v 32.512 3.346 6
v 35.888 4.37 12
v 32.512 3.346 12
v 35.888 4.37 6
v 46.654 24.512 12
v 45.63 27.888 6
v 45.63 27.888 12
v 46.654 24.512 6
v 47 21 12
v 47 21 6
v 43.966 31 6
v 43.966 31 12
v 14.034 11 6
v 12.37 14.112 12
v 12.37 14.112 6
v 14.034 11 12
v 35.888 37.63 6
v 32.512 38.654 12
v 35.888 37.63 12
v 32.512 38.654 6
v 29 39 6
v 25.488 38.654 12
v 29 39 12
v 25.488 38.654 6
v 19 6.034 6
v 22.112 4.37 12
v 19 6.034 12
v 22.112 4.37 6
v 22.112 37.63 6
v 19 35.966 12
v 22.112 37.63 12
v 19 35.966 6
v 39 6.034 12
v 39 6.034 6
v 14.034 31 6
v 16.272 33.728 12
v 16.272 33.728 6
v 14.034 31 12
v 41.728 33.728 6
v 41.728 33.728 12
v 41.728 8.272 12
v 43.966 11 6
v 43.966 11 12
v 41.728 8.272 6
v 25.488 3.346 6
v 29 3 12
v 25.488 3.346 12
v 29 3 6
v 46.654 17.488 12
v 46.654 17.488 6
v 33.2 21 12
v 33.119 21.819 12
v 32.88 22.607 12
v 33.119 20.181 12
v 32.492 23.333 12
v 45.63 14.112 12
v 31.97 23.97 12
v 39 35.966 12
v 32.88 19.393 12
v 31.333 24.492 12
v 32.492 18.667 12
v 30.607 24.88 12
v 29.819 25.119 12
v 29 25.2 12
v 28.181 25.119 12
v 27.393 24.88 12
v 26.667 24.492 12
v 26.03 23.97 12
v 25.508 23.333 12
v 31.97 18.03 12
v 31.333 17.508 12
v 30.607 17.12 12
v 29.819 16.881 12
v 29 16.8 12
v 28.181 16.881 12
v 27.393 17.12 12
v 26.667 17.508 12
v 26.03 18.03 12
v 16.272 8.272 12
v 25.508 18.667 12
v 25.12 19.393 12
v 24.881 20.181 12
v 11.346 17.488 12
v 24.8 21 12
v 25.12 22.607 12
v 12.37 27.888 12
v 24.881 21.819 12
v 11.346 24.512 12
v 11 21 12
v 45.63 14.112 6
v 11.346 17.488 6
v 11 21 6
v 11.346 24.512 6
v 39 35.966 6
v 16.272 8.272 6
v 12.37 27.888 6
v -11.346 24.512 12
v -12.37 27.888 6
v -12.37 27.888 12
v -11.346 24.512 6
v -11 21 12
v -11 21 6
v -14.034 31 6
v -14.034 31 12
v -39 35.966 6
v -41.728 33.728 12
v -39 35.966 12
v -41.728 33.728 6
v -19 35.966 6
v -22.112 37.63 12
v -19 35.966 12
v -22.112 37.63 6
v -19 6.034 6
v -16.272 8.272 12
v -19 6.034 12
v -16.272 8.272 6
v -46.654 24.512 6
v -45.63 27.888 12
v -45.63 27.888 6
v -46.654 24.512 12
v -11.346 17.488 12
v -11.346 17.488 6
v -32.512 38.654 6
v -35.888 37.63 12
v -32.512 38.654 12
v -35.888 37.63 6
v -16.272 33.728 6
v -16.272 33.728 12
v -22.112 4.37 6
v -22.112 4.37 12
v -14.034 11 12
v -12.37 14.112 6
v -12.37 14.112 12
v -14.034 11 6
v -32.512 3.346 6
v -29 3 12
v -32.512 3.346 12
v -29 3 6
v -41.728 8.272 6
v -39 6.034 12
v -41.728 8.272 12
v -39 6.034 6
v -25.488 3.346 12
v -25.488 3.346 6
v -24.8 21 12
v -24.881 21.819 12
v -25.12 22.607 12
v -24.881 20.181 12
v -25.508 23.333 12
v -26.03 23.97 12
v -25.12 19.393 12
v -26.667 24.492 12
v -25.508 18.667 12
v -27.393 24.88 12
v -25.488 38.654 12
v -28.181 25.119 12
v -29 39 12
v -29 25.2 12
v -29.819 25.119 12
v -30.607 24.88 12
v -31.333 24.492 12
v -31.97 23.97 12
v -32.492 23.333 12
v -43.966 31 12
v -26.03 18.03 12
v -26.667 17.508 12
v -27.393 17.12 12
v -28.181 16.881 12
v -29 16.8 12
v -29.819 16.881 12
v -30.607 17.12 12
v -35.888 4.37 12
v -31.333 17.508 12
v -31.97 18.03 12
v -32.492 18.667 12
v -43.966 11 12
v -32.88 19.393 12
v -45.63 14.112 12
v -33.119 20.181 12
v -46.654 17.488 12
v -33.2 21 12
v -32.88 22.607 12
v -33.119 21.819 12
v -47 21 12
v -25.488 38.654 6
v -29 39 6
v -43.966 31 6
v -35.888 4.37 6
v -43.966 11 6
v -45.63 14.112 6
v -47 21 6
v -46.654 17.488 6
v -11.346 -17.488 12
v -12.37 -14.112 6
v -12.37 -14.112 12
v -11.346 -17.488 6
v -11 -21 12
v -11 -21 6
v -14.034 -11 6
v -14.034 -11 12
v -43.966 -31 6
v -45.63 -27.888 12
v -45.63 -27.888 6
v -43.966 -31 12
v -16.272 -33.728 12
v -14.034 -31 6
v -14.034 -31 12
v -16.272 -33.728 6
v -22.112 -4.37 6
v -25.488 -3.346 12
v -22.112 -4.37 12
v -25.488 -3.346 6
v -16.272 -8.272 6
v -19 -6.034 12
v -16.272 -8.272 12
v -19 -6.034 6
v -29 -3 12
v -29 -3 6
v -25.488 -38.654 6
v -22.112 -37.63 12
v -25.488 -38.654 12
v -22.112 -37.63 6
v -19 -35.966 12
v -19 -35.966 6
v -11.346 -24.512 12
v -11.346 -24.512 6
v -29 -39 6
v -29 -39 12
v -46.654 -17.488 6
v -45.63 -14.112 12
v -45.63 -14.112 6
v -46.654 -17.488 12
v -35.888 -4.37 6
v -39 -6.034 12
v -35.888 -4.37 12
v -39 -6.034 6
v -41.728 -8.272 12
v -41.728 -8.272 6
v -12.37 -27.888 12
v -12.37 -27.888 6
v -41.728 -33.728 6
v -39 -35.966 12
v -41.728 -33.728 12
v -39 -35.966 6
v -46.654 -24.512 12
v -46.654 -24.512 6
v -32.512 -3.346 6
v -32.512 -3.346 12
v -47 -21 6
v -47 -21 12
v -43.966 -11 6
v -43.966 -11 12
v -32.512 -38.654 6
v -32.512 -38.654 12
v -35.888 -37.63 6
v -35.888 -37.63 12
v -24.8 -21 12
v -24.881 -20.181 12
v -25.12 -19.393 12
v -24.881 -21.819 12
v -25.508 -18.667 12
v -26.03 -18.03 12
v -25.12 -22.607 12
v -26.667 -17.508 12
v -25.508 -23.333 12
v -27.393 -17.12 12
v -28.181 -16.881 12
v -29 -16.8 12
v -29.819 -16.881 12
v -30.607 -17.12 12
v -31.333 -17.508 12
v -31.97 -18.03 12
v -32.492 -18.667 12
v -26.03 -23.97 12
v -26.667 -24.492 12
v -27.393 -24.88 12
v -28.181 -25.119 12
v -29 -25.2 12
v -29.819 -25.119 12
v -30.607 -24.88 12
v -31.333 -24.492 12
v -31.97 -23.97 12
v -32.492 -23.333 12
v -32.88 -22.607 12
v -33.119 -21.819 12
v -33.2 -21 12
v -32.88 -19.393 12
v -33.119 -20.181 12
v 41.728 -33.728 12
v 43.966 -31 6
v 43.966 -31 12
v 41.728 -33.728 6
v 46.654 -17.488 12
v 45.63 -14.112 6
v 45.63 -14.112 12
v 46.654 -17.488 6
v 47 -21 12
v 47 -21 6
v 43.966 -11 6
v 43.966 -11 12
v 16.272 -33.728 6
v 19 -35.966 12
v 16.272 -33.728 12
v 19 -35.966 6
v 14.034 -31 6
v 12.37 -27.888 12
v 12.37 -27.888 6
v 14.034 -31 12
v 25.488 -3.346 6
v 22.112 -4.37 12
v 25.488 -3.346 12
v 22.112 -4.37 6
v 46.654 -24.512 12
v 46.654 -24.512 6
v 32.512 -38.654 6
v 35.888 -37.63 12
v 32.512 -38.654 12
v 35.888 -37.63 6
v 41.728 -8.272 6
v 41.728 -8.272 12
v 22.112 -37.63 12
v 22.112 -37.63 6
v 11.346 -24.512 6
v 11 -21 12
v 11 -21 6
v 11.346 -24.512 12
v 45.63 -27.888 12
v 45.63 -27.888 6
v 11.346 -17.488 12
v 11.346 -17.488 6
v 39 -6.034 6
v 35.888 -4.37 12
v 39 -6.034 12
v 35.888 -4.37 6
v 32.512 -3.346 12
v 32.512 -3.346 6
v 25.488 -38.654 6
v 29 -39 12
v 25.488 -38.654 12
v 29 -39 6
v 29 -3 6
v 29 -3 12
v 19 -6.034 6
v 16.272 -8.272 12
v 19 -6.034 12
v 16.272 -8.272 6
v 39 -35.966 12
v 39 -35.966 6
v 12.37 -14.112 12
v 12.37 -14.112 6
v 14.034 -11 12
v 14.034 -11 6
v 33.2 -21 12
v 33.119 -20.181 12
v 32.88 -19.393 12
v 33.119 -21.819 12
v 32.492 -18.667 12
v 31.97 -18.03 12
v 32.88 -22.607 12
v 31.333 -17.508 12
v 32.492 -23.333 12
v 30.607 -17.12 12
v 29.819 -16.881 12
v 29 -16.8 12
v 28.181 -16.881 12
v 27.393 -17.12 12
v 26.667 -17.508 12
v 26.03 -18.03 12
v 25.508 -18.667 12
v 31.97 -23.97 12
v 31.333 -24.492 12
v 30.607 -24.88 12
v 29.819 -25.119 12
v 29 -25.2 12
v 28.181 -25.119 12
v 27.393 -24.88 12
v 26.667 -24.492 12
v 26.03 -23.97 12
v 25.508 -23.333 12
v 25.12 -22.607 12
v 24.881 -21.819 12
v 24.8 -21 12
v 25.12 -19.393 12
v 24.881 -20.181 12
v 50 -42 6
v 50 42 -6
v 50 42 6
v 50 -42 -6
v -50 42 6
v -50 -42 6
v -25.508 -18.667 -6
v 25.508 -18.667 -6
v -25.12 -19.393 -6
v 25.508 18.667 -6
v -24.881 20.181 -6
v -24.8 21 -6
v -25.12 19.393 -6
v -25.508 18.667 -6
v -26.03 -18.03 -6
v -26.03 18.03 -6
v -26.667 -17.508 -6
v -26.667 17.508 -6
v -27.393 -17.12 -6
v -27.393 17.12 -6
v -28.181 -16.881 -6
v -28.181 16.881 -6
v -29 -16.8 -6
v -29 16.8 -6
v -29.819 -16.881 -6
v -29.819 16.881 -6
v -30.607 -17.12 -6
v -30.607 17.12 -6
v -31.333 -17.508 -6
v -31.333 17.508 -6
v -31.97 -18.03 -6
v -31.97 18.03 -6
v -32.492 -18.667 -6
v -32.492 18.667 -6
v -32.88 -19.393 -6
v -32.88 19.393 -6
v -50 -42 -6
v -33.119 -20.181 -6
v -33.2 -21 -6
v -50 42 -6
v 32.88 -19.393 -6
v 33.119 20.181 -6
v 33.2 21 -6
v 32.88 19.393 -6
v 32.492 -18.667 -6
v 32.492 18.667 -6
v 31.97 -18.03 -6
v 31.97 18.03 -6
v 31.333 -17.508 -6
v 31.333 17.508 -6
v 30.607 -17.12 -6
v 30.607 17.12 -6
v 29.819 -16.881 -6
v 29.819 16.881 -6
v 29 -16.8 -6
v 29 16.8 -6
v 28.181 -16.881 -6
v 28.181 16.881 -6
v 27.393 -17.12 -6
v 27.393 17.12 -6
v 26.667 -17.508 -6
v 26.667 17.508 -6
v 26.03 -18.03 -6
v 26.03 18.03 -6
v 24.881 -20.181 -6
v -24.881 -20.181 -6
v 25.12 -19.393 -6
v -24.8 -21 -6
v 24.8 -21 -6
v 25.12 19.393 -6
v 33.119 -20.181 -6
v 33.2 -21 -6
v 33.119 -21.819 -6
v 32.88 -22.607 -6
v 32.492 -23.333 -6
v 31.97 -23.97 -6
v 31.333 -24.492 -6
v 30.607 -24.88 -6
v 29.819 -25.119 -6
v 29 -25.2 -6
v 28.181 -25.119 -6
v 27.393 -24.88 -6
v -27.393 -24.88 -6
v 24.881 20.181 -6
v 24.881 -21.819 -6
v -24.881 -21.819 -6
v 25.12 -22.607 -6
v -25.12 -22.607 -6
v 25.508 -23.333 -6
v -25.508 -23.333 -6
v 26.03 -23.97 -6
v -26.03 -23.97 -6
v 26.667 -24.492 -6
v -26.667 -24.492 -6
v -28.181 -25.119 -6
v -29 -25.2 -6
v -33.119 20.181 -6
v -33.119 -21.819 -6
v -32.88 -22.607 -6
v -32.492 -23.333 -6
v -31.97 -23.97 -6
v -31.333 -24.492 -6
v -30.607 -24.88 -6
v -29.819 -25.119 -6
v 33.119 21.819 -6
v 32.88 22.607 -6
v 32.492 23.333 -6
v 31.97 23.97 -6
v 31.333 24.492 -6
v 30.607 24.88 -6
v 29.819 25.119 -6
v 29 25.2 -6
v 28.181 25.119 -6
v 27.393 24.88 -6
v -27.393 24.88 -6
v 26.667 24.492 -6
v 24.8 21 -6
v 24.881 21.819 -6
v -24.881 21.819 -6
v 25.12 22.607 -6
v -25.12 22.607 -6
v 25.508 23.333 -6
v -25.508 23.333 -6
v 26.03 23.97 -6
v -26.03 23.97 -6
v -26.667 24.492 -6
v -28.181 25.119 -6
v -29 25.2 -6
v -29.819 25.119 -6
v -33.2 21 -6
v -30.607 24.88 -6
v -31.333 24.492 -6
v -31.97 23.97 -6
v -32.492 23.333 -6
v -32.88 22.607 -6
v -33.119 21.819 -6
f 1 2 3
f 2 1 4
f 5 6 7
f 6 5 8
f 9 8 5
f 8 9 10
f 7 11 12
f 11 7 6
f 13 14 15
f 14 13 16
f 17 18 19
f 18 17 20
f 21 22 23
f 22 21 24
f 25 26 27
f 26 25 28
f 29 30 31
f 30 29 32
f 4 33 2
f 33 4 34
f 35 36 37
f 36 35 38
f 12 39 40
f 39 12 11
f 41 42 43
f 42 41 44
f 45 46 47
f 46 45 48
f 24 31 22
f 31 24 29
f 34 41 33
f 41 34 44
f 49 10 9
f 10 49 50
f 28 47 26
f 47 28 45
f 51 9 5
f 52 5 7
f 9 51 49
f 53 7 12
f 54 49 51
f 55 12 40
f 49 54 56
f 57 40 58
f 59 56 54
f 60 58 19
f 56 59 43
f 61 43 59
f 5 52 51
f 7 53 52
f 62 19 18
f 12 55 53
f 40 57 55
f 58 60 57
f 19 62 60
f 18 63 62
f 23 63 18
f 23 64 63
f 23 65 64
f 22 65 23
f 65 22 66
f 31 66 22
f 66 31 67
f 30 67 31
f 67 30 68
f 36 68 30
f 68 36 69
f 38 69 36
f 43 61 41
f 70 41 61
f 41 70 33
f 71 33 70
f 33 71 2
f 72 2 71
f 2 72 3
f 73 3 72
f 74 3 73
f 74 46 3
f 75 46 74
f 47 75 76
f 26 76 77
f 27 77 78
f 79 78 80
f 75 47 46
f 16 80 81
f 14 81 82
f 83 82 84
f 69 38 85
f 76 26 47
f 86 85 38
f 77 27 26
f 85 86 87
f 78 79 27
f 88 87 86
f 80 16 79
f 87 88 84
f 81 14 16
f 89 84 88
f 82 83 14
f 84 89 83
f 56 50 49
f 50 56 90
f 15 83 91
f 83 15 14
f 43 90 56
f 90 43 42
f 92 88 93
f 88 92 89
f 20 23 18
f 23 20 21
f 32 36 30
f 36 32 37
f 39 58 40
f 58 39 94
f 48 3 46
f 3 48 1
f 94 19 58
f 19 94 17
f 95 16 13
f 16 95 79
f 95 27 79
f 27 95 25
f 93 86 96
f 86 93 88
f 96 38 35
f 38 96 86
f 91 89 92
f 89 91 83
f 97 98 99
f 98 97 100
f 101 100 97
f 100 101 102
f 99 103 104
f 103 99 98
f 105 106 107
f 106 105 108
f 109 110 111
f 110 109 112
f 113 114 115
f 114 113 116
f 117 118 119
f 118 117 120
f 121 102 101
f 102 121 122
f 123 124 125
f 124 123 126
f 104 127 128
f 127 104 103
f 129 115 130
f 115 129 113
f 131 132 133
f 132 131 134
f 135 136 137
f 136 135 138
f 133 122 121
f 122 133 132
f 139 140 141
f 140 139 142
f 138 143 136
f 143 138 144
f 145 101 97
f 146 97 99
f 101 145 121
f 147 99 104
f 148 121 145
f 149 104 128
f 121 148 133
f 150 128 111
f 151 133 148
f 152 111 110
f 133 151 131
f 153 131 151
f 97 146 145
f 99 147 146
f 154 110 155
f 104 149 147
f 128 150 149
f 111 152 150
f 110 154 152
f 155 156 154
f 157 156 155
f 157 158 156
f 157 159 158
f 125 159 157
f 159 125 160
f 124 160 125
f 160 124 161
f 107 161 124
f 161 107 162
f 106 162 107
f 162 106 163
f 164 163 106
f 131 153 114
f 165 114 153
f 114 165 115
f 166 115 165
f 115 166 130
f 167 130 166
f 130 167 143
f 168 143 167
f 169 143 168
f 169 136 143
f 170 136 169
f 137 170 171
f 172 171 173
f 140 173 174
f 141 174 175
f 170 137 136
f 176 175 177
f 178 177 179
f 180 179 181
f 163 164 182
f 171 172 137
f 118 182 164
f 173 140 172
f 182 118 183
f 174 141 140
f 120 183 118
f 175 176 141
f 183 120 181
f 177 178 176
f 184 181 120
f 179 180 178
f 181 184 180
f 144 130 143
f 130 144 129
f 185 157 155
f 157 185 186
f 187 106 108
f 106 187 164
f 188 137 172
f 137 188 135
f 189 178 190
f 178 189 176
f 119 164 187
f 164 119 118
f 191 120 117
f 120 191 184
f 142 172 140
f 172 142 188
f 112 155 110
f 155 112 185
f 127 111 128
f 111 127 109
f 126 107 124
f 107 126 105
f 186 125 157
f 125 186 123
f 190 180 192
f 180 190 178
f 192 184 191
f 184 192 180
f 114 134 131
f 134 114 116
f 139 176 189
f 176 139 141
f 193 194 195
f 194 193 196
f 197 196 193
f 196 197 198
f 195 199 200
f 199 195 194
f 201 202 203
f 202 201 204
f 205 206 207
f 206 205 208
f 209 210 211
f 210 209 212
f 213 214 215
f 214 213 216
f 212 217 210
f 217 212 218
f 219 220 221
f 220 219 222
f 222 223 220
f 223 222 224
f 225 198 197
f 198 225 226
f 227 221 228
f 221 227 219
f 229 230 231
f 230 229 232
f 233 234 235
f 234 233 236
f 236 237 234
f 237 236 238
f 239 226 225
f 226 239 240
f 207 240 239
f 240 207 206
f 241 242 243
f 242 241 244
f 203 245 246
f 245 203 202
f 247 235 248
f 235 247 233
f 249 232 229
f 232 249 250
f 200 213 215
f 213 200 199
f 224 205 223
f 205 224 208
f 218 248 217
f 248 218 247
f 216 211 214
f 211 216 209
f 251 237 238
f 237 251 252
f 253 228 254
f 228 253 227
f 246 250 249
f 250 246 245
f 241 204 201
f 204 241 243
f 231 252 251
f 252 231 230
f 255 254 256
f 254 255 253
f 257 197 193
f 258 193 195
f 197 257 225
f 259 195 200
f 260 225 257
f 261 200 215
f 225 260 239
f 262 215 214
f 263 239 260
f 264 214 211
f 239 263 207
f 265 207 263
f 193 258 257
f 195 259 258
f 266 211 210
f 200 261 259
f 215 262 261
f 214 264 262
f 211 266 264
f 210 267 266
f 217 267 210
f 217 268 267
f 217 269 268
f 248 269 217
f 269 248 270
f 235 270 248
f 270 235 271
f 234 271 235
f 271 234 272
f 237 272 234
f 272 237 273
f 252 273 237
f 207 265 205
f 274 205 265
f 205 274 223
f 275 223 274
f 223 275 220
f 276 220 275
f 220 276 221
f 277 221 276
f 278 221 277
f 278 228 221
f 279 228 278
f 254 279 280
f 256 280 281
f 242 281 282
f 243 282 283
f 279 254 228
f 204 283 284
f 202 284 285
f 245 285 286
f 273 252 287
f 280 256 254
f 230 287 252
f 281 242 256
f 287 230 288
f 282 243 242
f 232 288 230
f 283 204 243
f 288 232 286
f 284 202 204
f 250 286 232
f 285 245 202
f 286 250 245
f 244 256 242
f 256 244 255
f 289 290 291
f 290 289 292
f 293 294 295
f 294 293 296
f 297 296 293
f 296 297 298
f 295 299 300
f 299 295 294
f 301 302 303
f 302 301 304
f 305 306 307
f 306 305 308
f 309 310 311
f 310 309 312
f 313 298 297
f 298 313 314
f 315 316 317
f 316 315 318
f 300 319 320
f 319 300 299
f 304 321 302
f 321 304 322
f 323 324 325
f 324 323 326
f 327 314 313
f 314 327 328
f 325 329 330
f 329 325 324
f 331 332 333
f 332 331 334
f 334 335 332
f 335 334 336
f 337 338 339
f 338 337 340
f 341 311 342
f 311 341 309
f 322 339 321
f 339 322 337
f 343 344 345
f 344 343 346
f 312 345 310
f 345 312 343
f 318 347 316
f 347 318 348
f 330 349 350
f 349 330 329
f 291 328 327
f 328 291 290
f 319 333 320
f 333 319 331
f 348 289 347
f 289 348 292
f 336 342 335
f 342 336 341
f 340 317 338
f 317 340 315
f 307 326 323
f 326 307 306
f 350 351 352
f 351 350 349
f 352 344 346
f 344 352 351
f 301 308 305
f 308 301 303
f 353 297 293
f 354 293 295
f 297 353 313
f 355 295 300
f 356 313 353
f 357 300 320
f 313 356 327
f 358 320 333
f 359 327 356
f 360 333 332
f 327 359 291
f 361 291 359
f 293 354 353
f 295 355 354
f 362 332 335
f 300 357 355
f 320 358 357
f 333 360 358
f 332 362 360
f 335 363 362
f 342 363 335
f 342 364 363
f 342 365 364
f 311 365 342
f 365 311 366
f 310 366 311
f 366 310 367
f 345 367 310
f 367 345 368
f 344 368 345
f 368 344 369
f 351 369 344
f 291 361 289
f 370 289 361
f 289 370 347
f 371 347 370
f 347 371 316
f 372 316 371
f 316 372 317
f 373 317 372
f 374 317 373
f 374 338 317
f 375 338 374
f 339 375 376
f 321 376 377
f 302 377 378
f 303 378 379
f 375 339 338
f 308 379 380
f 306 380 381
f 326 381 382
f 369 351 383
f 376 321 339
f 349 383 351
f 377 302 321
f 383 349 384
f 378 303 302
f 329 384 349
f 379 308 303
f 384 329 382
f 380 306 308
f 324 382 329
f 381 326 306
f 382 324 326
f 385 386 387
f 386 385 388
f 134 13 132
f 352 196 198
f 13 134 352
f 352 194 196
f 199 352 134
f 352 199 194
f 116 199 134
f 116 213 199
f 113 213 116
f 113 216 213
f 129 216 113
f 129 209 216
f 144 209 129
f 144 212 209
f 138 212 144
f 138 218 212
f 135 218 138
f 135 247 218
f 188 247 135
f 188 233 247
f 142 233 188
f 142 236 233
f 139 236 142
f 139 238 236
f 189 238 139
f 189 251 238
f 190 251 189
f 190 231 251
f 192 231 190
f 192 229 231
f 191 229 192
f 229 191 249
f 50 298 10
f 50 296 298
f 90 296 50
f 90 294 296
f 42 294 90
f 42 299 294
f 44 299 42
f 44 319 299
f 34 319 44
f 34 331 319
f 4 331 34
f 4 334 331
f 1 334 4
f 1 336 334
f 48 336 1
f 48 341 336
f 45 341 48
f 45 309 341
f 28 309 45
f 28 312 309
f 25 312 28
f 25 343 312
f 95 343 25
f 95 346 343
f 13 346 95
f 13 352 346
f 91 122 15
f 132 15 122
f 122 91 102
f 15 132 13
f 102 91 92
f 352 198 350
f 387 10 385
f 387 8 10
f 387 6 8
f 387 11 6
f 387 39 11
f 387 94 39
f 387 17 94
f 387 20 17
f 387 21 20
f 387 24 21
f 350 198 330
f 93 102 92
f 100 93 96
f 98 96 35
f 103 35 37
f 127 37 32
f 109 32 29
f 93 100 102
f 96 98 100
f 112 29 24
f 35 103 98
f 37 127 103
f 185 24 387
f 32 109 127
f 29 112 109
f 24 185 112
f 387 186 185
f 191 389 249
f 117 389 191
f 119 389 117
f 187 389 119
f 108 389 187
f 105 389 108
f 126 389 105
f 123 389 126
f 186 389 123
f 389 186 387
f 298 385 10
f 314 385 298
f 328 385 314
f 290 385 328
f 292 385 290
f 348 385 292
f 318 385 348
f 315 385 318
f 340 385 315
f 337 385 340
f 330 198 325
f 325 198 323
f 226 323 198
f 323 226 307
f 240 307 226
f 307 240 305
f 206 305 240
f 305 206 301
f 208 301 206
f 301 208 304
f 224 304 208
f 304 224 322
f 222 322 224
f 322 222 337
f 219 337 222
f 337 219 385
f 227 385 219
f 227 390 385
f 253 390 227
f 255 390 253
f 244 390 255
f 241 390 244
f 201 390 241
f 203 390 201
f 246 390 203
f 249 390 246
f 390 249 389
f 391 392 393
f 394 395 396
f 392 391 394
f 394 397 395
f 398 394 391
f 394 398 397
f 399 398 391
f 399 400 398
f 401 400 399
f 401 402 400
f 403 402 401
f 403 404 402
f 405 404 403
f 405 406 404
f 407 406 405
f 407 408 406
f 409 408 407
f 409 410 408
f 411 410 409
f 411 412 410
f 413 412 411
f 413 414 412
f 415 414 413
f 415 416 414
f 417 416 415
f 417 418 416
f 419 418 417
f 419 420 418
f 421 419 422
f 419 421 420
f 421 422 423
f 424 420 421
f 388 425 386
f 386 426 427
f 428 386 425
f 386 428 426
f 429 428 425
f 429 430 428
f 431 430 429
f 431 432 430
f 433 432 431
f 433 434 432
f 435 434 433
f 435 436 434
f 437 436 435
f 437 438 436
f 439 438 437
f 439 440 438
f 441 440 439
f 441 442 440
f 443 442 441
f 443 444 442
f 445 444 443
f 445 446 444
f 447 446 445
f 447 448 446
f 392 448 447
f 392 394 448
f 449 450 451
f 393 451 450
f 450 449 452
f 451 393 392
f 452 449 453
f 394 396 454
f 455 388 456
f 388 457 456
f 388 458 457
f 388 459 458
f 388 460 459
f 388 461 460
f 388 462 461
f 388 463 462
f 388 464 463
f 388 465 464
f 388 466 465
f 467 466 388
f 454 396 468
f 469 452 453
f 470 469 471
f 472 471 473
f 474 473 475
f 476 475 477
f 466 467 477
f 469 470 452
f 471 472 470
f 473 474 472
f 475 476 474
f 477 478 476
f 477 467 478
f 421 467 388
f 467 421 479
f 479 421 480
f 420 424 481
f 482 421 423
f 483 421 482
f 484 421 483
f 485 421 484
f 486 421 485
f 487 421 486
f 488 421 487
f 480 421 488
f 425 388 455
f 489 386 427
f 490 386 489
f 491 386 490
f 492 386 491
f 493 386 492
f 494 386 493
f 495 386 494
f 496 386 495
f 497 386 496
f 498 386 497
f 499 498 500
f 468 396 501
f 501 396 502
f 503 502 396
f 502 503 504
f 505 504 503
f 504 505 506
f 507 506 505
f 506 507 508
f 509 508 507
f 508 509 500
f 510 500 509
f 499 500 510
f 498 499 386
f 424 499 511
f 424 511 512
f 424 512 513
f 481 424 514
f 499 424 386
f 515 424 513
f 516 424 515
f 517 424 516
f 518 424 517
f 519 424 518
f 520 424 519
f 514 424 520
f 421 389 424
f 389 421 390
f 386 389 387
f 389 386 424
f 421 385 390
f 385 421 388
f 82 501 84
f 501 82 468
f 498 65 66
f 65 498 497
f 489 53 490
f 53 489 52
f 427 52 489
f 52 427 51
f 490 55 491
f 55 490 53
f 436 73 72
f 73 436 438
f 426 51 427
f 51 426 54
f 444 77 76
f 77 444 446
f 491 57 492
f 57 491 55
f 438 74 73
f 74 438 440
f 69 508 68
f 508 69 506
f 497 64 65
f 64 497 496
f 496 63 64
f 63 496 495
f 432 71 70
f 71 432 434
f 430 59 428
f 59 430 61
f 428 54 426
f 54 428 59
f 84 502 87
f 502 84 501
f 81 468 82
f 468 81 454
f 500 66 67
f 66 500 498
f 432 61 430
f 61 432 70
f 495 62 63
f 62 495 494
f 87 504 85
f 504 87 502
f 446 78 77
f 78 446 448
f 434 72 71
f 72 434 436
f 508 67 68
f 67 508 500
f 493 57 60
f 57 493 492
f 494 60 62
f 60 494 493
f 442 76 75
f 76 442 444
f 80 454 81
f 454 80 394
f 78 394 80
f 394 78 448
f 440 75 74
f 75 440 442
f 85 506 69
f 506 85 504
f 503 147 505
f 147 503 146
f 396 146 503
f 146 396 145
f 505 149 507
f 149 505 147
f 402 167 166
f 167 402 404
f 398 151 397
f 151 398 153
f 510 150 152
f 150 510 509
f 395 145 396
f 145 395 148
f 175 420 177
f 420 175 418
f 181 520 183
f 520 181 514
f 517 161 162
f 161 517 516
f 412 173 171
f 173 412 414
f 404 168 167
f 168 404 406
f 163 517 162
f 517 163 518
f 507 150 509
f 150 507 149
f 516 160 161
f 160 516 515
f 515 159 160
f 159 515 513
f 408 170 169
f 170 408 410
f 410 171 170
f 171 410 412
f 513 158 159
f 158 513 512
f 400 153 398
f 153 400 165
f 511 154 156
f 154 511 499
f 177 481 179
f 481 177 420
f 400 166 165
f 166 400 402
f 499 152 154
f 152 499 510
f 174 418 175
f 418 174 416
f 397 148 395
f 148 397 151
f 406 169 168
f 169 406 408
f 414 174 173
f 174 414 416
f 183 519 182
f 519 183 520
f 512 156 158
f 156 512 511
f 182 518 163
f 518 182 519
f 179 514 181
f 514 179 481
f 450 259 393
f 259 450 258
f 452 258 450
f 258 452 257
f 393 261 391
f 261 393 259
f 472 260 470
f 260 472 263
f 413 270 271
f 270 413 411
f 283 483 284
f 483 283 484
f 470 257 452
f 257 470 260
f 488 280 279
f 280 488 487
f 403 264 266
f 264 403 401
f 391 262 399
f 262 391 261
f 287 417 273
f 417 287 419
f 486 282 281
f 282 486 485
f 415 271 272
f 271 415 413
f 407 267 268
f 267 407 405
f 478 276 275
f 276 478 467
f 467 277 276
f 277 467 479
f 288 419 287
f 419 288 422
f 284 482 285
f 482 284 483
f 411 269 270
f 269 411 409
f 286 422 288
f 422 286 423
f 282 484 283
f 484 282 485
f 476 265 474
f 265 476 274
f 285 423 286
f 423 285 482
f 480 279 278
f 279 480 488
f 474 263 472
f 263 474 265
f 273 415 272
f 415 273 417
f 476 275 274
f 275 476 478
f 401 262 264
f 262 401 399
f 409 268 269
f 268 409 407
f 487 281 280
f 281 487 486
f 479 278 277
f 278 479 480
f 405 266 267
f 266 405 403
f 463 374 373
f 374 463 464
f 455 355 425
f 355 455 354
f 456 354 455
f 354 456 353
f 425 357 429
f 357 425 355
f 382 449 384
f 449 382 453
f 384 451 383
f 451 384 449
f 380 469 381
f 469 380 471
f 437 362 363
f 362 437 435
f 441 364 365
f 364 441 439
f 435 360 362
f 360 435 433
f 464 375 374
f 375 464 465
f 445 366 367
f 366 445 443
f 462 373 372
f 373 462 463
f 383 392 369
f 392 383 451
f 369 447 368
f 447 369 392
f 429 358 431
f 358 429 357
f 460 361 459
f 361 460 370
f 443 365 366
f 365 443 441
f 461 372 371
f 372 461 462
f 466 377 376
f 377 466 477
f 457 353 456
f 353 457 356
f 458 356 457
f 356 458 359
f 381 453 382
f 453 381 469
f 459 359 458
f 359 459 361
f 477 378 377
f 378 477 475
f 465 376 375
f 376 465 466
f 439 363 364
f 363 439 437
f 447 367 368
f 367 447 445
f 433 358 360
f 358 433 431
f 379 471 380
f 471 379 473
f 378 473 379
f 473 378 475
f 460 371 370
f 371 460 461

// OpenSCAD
$fn = 32;

// ----------------------------------------------------------------------
// Anchor pads 100 x 84 x 18
// four corner bosses with anchor holes
// ----------------------------------------------------------------------

// --- parameters (mm) ---
plate = [100, 84, 12];  // base plate size (x, y, z)
pads = 4;               // boss count, one per corner
edge = 21;              // boss centre offset from the plate edge
boss_d = 36;            // boss diameter
boss_h = 6;             // boss height above the base plate
hole_d = 8.4;           // hole diameter

// --- derived feature positions (mm) ---
height = plate[2] + boss_h;      // = 18   overall height of the part
corner_x = plate[0] / 2 - edge;  // = 29   boss centre X
corner_y = plate[1] / 2 - edge;  // = 21   boss centre Y
feature_centers = [
  [corner_x, corner_y],
  [-corner_x, corner_y],
  [-corner_x, -corner_y],
  [corner_x, -corner_y]
];   // boss centres, anchor holes are drilled there

// base plate, four bosses standing on it, anchor holes all the way through
difference() {
  union() {
    cube(plate, center = true);
    for (centre = feature_centers)
      translate([centre[0], centre[1], plate[2] / 2 - 1])
        cylinder(d = boss_d, h = boss_h + 1);
  }
  for (centre = feature_centers)
    translate([centre[0], centre[1], -height])
      cylinder(d = hole_d, h = 2 * height + 2);  // through boss and plate
}
